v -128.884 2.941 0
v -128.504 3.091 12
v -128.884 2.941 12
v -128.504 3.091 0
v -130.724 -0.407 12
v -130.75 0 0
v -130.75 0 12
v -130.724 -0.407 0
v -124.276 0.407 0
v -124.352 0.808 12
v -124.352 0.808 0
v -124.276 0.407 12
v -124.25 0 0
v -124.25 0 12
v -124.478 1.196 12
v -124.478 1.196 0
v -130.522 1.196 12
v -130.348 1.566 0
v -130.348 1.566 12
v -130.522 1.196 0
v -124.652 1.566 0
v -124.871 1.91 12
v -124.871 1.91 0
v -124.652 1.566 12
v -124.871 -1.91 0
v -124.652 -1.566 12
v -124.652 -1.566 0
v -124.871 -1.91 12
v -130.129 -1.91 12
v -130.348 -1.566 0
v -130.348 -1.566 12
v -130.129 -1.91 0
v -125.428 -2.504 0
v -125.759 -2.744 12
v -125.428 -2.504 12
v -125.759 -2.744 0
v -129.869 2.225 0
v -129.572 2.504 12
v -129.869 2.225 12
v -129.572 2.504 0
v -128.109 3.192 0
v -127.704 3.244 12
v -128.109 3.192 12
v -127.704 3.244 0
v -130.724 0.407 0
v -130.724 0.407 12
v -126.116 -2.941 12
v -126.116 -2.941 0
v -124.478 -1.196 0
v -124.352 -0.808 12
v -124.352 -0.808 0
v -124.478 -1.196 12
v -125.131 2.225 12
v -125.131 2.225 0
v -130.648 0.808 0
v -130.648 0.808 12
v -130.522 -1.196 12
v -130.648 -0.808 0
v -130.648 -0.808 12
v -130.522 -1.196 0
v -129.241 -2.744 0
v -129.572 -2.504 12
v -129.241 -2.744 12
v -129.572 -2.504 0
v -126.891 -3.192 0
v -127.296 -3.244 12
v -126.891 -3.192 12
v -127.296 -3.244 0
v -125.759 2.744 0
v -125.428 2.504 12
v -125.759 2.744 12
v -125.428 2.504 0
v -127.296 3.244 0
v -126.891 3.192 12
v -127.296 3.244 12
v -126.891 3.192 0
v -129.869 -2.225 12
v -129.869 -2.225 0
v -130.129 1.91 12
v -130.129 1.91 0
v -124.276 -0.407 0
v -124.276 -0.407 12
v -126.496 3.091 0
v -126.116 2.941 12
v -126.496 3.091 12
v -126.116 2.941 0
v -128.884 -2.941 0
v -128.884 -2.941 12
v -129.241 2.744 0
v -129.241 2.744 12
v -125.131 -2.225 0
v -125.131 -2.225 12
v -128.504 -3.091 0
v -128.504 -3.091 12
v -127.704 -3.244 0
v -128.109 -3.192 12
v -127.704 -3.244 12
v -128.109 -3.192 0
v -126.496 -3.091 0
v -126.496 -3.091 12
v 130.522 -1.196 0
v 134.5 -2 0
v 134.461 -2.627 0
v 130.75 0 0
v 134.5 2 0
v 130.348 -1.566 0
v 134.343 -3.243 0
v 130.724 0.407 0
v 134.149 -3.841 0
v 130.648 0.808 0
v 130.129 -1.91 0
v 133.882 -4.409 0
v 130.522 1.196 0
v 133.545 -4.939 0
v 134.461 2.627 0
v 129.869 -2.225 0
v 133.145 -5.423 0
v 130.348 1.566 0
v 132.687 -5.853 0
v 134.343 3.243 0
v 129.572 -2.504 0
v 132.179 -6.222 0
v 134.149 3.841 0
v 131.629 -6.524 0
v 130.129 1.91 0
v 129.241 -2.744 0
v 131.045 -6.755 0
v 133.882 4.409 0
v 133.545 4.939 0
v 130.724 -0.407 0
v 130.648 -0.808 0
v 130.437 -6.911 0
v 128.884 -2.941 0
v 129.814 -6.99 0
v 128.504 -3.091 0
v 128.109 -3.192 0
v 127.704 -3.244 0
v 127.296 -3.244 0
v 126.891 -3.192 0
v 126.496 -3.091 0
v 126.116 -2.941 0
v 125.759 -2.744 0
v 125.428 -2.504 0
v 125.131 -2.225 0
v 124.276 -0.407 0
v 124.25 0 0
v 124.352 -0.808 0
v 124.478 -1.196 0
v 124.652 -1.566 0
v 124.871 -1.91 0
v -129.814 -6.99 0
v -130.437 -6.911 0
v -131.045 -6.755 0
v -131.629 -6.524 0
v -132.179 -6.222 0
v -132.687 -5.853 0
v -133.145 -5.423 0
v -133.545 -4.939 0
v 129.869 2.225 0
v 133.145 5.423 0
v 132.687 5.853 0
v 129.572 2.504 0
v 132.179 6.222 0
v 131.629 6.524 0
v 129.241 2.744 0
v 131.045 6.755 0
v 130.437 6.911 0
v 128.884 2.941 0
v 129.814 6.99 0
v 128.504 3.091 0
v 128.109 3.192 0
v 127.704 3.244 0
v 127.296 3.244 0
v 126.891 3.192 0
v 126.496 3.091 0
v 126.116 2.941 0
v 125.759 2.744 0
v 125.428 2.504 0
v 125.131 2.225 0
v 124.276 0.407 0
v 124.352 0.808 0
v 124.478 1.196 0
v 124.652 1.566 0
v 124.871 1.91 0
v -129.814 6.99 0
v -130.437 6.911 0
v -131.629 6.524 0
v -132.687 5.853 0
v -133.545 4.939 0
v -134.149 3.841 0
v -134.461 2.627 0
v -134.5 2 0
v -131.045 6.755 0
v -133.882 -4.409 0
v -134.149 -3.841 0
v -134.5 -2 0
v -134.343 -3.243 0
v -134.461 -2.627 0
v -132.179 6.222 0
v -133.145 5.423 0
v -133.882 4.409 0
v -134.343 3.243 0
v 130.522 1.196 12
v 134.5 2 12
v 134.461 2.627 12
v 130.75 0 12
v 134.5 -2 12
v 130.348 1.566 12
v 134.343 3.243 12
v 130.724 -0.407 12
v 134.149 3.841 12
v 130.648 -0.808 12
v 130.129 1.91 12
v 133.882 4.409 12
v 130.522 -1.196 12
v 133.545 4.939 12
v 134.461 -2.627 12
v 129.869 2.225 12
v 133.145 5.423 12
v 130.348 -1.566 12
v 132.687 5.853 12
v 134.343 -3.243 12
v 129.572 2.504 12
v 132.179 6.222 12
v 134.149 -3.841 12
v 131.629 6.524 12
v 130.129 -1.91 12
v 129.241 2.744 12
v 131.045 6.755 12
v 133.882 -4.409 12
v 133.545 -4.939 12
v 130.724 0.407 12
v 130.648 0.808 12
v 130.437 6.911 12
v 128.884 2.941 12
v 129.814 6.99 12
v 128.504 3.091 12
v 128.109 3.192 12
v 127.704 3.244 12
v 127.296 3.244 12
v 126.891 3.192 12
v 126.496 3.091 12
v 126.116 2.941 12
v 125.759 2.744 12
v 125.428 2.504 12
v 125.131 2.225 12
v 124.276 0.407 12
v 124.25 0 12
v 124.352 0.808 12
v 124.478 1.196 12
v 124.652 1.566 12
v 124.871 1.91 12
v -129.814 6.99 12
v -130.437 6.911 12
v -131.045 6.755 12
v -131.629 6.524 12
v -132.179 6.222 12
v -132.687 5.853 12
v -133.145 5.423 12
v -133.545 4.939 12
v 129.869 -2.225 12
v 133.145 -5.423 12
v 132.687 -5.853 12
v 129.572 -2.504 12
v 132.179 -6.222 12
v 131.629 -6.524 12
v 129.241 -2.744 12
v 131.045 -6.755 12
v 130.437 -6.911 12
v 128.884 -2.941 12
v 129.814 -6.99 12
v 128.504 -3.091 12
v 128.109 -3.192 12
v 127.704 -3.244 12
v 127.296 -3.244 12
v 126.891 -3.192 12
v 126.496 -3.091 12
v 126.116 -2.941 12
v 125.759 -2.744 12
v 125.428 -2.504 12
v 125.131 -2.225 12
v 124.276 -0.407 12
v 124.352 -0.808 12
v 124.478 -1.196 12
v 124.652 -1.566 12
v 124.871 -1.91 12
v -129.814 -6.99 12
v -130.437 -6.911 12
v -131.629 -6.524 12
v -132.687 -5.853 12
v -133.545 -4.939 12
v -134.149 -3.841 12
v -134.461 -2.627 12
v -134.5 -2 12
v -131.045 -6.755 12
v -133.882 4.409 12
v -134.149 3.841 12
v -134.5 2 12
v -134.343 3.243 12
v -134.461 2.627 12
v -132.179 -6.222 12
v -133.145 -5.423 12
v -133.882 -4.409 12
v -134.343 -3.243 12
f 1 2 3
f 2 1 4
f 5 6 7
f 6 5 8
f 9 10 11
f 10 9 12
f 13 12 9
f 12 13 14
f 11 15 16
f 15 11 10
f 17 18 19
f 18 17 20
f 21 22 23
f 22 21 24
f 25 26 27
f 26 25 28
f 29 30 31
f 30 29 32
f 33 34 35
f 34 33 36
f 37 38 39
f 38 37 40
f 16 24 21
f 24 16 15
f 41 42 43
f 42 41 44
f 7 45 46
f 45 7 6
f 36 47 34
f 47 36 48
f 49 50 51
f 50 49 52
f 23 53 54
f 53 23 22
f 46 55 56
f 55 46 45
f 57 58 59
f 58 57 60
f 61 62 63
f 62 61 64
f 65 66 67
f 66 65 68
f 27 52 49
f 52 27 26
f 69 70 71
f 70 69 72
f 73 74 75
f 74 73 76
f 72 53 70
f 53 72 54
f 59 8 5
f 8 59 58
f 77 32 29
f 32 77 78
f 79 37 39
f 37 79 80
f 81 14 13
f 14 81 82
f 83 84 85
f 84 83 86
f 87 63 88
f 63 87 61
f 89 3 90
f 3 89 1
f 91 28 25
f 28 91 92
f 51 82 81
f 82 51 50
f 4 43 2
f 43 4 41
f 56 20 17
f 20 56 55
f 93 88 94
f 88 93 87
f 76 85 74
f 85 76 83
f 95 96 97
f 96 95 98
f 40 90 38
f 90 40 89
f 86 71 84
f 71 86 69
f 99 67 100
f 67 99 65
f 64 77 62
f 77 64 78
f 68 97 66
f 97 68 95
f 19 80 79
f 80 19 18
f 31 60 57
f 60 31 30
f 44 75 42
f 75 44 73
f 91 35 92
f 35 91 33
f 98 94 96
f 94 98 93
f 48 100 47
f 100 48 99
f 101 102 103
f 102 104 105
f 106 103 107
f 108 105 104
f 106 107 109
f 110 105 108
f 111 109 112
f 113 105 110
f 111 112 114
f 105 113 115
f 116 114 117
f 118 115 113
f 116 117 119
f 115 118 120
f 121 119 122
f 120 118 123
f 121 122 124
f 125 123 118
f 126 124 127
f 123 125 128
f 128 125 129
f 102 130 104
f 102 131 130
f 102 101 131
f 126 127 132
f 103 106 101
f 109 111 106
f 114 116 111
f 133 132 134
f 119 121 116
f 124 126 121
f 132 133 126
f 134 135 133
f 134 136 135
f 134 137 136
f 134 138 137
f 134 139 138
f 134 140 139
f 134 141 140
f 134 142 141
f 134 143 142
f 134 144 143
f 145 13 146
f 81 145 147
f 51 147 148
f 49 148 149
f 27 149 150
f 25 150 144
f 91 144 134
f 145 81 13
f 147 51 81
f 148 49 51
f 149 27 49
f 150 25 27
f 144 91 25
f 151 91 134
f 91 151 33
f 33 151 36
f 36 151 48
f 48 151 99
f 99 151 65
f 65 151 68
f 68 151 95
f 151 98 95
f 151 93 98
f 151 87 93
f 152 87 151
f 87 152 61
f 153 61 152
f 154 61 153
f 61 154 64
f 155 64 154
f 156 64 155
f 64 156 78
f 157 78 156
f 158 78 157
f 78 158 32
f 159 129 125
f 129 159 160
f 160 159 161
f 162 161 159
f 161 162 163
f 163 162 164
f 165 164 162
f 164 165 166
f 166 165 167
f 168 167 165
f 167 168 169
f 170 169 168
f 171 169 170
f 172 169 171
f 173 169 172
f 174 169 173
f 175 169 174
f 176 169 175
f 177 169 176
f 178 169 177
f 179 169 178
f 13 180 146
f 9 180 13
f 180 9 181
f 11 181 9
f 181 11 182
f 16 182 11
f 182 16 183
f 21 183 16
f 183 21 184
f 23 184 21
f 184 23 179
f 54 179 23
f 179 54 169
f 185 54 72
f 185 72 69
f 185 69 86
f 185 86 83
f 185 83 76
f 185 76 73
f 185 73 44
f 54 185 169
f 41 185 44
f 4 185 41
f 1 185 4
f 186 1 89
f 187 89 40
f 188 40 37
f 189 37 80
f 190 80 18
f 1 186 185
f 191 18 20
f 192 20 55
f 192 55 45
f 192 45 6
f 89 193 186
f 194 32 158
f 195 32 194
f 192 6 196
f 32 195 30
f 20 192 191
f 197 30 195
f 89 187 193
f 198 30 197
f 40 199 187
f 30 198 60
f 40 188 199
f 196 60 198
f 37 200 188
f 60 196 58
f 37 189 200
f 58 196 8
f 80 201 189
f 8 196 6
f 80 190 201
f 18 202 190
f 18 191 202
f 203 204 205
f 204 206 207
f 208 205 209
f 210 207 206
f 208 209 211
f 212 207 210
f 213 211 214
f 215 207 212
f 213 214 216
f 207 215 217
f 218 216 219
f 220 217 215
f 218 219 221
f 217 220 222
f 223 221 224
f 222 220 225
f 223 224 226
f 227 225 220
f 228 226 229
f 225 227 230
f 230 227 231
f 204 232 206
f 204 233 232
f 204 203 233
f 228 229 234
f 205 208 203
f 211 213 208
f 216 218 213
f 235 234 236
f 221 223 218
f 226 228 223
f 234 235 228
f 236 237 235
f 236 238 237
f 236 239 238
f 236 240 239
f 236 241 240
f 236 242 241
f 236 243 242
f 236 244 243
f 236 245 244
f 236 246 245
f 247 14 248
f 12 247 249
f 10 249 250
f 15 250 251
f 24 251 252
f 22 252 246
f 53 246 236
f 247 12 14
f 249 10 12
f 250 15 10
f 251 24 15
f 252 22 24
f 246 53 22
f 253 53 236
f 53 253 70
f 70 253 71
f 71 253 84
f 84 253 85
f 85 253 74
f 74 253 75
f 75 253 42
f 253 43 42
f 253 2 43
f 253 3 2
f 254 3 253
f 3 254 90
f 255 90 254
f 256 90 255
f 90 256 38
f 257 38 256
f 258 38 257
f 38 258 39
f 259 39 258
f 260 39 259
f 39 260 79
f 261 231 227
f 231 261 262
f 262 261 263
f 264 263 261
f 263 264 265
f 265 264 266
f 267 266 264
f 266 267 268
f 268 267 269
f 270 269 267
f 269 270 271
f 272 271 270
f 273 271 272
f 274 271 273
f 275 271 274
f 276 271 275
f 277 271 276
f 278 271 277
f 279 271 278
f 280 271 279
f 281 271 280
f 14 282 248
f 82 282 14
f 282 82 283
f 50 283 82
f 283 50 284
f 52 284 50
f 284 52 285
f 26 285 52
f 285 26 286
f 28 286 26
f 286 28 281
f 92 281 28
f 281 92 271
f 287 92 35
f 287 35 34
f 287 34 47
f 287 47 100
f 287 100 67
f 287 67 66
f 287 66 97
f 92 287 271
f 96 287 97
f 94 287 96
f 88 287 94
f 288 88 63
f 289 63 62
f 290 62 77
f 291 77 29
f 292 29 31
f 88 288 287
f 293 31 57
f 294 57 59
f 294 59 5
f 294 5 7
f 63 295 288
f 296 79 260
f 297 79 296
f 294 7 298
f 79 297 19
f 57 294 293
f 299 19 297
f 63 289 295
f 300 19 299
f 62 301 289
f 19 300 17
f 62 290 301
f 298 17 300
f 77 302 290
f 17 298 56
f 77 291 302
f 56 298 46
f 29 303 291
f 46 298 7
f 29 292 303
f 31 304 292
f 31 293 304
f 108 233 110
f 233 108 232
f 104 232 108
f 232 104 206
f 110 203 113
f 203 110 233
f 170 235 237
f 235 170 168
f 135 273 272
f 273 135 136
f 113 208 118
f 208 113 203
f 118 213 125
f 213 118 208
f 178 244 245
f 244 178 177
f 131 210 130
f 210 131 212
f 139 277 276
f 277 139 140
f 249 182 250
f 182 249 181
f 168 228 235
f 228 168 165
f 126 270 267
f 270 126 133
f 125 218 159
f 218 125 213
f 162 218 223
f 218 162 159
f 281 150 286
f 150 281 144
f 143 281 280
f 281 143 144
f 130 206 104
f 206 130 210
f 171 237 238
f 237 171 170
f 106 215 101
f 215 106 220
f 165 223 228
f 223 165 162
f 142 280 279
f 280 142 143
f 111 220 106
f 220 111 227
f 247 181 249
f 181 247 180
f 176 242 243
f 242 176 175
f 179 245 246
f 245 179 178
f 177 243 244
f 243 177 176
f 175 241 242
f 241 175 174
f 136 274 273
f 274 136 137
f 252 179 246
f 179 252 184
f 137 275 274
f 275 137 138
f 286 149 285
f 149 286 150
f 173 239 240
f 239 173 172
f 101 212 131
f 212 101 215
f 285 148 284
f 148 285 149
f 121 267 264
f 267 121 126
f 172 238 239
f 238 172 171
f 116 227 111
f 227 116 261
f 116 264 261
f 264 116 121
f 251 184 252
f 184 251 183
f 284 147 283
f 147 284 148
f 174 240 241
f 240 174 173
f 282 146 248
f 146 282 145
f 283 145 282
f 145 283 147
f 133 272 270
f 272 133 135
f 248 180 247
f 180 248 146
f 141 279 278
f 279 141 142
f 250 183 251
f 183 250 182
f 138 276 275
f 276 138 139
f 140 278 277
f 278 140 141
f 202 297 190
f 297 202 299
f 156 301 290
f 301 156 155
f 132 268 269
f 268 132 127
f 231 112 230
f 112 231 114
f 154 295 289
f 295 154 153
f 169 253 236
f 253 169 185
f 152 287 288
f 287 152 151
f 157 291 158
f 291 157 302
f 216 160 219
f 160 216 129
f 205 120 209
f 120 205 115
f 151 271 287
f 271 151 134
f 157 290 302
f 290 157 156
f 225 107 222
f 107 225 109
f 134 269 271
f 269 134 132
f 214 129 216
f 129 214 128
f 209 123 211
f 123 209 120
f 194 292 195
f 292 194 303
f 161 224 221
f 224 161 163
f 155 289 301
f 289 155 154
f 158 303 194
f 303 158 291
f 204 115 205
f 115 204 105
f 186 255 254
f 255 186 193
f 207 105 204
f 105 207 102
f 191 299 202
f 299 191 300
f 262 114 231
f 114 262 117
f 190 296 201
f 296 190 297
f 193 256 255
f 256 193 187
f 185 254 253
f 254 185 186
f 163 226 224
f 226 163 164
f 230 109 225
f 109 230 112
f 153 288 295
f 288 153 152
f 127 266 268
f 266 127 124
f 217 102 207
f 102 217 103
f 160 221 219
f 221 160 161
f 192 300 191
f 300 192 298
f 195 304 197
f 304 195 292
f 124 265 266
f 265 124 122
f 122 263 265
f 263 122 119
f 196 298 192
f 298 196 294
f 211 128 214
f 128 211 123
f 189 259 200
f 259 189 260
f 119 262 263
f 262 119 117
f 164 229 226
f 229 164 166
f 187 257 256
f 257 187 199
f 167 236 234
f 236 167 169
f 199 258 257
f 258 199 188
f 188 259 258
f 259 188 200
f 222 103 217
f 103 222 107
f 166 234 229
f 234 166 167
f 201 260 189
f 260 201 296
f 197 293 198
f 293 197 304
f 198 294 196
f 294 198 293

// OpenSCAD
$fn = 50;


difference() {
	union() {
		hull() {
			translate(v = [-129.5000000000, 2.0000000000, 0]) {
				cylinder(h = 12, r = 5);
			}
			translate(v = [129.5000000000, 2.0000000000, 0]) {
				cylinder(h = 12, r = 5);
			}
			translate(v = [-129.5000000000, -2.0000000000, 0]) {
				cylinder(h = 12, r = 5);
			}
			translate(v = [129.5000000000, -2.0000000000, 0]) {
				cylinder(h = 12, r = 5);
			}
		}
	}
	union() {
		translate(v = [-127.5000000000, 0.0000000000, 0]) {
			cylinder(h = 12, r = 3.2500000000);
		}
		translate(v = [127.5000000000, 0.0000000000, 0]) {
			cylinder(h = 12, r = 3.2500000000);
		}
		translate(v = [-127.5000000000, 0.0000000000, 0]) {
			cylinder(h = 12, r = 1.8000000000);
		}
		translate(v = [127.5000000000, 0.0000000000, 0]) {
			cylinder(h = 12, r = 1.8000000000);
		}
		translate(v = [-127.5000000000, 0.0000000000, 0]) {
			cylinder(h = 12, r = 1.8000000000);
		}
		translate(v = [127.5000000000, 0.0000000000, 0]) {
			cylinder(h = 12, r = 1.8000000000);
		}
		translate(v = [-127.5000000000, 0.0000000000, 0]) {
			cylinder(h = 12, r = 1.8000000000);
		}
		translate(v = [127.5000000000, 0.0000000000, 0]) {
			cylinder(h = 12, r = 1.8000000000);
		}
	}
}
